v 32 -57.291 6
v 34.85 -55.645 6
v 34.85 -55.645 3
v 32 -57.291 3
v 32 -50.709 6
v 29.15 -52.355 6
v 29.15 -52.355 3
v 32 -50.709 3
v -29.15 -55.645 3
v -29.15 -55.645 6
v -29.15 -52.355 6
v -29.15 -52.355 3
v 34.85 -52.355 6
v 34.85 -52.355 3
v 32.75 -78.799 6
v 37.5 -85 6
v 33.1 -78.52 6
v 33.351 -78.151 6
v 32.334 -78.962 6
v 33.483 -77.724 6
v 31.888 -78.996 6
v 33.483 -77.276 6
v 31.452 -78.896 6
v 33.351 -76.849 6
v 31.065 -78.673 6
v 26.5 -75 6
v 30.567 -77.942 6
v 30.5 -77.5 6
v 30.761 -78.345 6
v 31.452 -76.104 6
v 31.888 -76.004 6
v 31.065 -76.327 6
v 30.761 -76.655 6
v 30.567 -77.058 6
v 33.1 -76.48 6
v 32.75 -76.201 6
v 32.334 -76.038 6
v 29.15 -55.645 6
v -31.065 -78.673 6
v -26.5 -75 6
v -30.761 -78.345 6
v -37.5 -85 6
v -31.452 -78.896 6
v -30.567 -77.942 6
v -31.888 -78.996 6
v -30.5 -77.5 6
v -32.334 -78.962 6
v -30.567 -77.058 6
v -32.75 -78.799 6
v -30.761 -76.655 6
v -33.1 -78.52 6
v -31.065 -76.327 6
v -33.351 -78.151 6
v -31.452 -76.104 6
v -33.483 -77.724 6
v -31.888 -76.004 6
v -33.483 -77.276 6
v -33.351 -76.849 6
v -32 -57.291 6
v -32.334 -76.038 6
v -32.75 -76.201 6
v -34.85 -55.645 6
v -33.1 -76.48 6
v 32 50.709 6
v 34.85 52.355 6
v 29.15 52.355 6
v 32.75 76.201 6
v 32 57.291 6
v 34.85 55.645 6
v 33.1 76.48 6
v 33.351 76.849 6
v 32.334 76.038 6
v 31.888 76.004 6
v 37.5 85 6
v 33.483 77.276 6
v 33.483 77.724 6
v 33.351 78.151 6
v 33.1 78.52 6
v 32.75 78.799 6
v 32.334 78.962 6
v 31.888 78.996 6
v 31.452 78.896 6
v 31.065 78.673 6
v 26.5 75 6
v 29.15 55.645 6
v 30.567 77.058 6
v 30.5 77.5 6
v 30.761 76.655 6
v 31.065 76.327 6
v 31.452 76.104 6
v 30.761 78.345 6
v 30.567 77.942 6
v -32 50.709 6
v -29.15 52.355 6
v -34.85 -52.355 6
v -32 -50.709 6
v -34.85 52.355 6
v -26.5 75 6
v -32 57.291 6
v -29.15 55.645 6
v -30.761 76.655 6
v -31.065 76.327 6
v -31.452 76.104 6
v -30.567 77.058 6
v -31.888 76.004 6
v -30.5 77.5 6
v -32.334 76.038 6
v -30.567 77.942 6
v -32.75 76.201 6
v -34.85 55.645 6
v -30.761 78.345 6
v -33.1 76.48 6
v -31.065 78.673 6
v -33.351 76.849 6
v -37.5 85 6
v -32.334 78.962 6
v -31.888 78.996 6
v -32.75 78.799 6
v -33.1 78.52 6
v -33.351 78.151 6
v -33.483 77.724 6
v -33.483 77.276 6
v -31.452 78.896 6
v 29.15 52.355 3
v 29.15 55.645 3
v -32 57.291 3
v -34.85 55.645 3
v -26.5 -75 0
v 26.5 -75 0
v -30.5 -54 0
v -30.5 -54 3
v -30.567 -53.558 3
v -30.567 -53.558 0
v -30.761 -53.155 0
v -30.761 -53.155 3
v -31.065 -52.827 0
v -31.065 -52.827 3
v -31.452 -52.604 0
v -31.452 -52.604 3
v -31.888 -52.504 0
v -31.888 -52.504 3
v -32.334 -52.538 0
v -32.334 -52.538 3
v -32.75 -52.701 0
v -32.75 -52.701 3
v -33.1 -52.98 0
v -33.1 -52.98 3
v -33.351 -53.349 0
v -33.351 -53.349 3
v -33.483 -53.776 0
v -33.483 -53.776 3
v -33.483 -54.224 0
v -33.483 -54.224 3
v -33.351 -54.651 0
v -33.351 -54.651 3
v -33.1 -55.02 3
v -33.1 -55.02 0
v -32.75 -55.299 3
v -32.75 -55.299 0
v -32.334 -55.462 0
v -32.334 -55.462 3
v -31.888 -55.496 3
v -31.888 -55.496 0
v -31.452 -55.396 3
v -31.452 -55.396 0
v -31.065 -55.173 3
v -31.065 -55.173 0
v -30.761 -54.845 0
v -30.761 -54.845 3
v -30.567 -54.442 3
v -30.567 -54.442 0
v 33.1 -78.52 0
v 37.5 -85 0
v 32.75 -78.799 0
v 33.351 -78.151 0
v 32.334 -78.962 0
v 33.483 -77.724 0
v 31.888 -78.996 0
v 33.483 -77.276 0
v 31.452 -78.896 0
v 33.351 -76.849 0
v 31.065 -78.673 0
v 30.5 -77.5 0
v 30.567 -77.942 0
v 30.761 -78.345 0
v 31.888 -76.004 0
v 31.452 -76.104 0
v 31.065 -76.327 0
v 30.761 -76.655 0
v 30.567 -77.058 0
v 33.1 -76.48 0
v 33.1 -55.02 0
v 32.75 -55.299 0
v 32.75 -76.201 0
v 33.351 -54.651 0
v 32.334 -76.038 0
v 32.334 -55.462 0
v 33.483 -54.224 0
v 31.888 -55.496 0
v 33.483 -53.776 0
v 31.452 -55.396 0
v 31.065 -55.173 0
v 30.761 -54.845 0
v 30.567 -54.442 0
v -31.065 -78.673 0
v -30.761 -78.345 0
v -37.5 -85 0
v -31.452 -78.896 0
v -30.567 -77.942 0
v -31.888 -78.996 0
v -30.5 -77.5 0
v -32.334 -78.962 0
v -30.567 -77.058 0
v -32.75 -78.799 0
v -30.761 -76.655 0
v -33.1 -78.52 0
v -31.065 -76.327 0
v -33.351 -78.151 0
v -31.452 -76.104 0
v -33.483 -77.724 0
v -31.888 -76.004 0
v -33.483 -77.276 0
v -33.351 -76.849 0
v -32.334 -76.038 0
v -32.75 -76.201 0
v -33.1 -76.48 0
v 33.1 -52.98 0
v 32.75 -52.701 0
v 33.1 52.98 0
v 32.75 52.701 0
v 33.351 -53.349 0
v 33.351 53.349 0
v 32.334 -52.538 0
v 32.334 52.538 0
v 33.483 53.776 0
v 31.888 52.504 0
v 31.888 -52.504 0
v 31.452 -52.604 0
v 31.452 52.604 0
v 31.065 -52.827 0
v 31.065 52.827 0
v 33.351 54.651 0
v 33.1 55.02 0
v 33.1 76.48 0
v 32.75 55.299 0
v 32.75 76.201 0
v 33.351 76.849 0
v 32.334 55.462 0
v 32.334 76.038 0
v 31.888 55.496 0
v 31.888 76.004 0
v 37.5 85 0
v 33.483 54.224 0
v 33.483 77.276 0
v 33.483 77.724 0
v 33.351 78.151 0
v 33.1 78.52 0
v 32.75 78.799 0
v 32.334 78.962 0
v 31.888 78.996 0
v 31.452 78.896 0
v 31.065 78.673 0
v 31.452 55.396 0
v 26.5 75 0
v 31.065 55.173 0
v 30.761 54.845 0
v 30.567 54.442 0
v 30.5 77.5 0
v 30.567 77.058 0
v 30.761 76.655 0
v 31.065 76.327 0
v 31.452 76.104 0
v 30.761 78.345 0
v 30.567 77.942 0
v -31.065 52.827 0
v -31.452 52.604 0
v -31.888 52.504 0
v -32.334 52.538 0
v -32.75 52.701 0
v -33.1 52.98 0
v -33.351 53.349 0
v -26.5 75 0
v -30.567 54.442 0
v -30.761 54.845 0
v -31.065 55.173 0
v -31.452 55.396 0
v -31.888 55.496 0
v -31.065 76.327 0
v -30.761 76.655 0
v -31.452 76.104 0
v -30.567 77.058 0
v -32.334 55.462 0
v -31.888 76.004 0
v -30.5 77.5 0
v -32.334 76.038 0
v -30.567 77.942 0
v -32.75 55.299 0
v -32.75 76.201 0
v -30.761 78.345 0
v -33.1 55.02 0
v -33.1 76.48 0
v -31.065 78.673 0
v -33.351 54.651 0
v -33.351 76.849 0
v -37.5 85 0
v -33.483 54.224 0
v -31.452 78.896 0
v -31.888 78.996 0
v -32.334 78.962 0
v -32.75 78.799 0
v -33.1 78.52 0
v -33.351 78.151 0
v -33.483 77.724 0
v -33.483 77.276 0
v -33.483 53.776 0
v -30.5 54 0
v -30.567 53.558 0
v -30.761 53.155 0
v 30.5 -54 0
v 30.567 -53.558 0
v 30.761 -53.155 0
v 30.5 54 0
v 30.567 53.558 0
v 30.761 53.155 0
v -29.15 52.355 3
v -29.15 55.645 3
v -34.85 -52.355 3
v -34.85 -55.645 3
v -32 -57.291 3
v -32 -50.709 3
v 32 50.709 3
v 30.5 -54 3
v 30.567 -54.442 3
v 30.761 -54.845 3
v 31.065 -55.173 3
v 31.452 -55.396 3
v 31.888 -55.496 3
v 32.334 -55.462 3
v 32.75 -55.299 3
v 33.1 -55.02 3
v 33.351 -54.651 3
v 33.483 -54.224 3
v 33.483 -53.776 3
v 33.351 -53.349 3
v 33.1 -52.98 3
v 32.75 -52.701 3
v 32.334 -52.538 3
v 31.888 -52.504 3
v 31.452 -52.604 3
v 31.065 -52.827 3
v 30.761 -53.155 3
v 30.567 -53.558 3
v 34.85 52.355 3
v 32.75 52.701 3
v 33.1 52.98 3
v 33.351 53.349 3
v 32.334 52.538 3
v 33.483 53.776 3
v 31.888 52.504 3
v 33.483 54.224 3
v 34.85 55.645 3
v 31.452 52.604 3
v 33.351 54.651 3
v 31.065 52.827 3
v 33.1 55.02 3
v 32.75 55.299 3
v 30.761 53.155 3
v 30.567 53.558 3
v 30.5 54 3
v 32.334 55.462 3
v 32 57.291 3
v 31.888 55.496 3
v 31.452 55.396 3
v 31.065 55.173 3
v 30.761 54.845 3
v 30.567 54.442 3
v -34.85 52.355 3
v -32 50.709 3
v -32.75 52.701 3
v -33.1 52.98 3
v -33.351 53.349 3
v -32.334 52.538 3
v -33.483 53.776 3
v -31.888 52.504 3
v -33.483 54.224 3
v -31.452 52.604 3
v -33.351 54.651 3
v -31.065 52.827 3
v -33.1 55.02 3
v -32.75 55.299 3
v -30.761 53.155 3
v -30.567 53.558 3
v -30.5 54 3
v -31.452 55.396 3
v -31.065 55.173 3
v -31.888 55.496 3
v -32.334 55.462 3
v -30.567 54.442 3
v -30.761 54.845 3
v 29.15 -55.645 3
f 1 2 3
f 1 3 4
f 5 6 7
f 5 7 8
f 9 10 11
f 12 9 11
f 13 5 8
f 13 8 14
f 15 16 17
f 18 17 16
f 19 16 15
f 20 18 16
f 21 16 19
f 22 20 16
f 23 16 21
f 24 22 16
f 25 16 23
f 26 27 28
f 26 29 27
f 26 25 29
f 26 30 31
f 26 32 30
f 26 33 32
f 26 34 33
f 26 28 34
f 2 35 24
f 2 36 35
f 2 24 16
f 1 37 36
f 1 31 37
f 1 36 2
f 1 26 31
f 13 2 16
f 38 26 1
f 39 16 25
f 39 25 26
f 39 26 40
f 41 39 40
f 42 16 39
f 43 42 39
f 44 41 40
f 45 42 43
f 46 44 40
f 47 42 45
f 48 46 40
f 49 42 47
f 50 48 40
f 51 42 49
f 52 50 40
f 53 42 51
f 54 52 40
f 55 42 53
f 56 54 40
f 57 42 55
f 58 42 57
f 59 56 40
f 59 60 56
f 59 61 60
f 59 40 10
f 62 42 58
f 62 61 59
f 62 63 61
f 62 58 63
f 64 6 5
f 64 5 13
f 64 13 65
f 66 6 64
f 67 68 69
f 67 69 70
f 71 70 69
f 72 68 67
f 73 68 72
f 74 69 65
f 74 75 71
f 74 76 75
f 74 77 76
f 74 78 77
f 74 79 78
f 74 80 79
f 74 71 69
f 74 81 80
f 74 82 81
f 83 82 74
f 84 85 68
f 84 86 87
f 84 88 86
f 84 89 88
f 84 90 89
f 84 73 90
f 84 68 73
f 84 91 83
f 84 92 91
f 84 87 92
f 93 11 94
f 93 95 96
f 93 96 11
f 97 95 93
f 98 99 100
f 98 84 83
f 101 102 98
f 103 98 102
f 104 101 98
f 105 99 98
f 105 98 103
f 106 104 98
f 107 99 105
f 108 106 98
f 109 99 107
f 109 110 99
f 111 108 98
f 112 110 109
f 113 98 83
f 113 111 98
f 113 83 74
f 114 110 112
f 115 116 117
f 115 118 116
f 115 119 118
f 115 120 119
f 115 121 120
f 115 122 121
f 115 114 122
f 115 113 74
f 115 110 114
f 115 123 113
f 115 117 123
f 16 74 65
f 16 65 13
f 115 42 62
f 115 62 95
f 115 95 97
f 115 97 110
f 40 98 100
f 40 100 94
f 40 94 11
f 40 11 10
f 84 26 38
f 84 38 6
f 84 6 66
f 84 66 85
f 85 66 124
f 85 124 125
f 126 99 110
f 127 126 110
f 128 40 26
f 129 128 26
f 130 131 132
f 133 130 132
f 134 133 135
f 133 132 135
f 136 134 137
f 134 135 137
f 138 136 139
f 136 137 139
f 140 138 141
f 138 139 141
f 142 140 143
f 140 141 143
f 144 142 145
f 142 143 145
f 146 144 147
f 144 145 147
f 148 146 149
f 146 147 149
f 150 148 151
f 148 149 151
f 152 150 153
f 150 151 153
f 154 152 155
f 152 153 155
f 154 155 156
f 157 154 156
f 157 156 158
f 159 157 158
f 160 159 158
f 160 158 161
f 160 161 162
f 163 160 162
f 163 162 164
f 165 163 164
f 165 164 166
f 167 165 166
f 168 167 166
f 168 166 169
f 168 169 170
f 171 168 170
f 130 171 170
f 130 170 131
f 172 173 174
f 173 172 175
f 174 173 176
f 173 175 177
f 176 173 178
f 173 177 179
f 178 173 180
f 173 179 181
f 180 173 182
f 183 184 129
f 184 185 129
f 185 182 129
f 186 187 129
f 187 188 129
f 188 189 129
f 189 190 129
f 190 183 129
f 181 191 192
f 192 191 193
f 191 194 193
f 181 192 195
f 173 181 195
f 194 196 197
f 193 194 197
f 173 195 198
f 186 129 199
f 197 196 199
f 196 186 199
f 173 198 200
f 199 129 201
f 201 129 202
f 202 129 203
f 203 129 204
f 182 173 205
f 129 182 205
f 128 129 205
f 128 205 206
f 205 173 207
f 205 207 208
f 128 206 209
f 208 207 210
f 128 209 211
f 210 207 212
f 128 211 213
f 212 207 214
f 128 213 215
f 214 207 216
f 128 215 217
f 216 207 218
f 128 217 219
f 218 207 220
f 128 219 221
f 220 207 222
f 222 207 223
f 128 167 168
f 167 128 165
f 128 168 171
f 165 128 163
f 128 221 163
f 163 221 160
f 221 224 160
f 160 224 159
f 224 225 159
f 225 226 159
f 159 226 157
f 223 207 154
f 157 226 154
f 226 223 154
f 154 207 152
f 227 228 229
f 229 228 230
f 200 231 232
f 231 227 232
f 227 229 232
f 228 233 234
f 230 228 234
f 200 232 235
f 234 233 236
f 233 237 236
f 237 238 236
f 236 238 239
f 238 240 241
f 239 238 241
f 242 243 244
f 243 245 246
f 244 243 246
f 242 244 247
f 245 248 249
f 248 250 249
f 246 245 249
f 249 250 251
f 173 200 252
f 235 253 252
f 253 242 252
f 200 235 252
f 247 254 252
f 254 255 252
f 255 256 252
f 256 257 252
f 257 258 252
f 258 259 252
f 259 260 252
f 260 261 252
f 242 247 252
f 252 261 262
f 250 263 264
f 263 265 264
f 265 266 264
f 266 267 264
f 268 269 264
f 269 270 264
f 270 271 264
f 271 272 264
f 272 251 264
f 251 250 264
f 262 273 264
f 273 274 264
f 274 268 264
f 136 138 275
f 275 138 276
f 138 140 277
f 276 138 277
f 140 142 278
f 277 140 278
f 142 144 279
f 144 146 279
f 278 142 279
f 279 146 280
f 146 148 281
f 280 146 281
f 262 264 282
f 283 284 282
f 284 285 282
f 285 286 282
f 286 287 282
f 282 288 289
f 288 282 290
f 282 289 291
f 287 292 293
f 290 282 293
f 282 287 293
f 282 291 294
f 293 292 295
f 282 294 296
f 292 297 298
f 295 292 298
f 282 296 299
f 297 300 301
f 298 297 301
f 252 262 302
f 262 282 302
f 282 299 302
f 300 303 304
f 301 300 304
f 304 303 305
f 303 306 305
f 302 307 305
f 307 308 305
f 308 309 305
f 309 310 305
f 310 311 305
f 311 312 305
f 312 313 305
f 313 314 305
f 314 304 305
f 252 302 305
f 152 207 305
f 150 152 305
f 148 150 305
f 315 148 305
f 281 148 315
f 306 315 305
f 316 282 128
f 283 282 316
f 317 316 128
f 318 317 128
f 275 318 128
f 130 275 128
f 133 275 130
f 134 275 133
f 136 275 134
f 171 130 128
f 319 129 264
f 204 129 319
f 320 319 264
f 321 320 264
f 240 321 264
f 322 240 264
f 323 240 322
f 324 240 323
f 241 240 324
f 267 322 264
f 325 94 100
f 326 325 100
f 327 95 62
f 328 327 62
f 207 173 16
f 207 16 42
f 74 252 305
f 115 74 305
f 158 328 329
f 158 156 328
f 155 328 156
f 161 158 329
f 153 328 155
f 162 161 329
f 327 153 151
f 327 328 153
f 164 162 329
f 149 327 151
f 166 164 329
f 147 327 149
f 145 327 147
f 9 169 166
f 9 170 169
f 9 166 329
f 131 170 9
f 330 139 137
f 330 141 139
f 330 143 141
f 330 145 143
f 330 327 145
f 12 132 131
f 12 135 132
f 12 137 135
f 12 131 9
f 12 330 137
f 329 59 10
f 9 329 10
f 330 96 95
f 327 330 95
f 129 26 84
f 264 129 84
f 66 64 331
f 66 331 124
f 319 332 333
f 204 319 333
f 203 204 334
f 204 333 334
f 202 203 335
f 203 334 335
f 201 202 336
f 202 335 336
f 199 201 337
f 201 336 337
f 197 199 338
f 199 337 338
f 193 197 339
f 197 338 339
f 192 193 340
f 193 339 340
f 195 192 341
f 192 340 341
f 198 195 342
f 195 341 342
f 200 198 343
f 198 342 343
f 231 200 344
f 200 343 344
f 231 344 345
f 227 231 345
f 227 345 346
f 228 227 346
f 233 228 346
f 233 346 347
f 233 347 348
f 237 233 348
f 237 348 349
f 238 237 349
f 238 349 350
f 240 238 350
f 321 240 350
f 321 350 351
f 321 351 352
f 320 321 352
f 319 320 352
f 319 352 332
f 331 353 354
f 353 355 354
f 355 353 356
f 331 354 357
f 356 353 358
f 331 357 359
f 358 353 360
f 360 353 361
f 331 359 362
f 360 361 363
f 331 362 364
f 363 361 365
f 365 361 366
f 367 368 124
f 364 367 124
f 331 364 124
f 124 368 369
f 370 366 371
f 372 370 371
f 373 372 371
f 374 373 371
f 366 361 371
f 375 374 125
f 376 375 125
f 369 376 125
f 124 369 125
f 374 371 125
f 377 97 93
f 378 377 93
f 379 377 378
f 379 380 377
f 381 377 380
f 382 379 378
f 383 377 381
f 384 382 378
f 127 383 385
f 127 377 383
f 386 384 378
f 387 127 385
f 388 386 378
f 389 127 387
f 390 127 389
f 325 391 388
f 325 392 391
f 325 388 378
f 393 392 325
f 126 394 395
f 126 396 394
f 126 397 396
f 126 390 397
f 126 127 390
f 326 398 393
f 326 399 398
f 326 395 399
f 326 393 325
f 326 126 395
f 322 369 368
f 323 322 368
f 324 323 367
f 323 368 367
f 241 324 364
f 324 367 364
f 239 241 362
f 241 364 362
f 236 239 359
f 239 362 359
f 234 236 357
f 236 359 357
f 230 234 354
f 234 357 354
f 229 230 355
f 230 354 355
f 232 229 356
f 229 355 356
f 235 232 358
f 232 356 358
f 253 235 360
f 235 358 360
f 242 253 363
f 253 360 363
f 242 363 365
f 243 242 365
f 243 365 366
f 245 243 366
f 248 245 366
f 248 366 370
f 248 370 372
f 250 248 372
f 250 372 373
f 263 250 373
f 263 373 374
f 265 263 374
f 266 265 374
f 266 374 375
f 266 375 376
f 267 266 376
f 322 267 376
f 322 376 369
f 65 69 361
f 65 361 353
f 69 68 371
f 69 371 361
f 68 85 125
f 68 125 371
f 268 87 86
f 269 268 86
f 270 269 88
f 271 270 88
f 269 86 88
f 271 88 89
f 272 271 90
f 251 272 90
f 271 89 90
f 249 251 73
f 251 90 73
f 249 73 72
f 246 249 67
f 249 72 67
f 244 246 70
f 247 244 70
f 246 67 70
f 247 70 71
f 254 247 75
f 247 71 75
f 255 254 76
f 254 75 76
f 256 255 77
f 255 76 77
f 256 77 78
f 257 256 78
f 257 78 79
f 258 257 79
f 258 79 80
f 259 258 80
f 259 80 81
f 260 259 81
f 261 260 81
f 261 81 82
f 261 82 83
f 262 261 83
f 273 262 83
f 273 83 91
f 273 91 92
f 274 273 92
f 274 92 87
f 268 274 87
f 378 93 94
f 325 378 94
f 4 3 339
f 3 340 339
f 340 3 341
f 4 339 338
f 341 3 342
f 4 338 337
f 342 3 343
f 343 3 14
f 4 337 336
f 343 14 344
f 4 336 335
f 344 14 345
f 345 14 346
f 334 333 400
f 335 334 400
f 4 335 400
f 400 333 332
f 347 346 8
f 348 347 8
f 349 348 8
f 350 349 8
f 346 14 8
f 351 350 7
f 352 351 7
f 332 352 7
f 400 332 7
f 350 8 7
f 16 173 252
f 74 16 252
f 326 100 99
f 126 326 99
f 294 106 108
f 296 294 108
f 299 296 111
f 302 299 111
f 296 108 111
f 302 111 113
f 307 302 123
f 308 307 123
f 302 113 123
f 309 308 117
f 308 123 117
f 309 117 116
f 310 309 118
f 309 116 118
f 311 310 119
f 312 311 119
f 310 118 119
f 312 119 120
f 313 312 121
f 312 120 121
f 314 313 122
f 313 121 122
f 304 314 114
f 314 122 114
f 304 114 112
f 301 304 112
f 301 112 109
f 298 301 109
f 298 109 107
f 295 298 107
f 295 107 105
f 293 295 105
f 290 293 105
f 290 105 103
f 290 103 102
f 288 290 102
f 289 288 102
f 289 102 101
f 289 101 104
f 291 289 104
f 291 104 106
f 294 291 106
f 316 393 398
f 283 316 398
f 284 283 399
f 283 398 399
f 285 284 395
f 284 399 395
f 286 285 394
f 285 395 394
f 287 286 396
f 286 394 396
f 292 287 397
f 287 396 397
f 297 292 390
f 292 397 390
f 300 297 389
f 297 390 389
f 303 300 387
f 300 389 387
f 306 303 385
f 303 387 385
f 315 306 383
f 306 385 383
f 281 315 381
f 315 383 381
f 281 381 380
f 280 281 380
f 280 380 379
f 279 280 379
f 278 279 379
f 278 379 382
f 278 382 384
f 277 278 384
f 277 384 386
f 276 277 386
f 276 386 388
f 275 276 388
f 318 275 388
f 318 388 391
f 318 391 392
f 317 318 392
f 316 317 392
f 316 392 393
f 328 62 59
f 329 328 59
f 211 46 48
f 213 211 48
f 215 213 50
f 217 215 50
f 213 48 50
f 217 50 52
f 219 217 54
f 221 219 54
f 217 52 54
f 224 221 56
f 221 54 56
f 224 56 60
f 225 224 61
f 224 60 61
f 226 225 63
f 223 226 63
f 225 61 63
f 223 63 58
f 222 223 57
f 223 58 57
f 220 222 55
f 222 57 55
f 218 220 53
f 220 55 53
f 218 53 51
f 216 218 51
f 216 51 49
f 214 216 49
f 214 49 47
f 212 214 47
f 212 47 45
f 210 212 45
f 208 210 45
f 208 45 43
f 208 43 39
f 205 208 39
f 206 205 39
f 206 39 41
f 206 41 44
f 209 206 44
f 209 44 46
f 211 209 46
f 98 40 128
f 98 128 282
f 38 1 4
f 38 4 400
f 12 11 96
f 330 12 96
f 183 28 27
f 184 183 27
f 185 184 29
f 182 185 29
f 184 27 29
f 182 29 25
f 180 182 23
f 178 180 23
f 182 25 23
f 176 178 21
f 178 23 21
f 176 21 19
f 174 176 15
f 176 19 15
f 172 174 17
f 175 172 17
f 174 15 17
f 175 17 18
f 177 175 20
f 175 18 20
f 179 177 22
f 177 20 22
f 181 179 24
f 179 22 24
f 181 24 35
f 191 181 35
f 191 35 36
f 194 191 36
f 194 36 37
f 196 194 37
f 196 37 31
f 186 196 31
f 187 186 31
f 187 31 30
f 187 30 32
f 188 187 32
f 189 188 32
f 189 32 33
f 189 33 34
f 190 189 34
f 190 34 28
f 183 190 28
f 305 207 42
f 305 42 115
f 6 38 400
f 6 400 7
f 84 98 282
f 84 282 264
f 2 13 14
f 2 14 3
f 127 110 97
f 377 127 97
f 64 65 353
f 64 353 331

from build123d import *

# Parameters (mm, degrees)
SKETCH1_W           = 170
SKETCH1_H           = 75
BOSS_EXTRUDE1_DEPTH = 6
SKETCH2_R           = 1.5
CUT_EXTRUDE1_DEPTH  = 94.098066575
CUT_EXTRUDE3_DEPTH  = 3
SKETCH6_W           = 53
SKETCH6_H           = 150
CUT_EXTRUDE4_DEPTH  = 10


with BuildPart() as part:
    # Sketch1 → Boss-Extrude1 (new body)
    with BuildSketch(Plane(origin=(0, 0, 0), x_dir=(0, 1, 0), z_dir=(0, 0, 1))):
        Rectangle(SKETCH1_W, SKETCH1_H)
    extrude(amount=BOSS_EXTRUDE1_DEPTH)

    # Sketch2 → Cut-Extrude1 (cut, through all)
    with BuildSketch(Plane.XY.offset(6)):
        with Locations((-32, 54)):
            Circle(SKETCH2_R)
        with Locations((-32, -54)):
            Circle(SKETCH2_R)
        with Locations((-32, -77.5)):
            Circle(SKETCH2_R)
        with Locations((-32, 77.5)):
            Circle(SKETCH2_R)
        with Locations(Location((32, -77.5, 0), (0, 0, 180))):
            Circle(SKETCH2_R)
        with Locations(Location((32, -54, 0), (0, 0, 180))):
            Circle(SKETCH2_R)
        with Locations(Location((32, 54, 0), (0, 0, 180))):
            Circle(SKETCH2_R)
        with Locations(Location((32, 77.5, 0), (0, 0, 180))):
            Circle(SKETCH2_R)
    extrude(amount=-CUT_EXTRUDE1_DEPTH, mode=Mode.SUBTRACT)

    # Sketch5 → Cut-Extrude3 (cut)
    with BuildSketch(Plane.XY.offset(6)):
        Polygon((-29.15, -55.645448267), (-29.15, -52.354551733), (-32, -50.709103466), (-34.85, -52.354551733), (-34.85, -55.645448267), (-32, -57.290896534), align=None)
        Polygon((32, -57.290896534), (29.15, -55.645448267), (29.15, -52.354551733), (32, -50.709103466), (34.85, -52.354551733), (34.85, -55.645448267), align=None)
        Polygon((-29.15, 55.645448267), (-32, 57.290896534), (-34.85, 55.645448267), (-34.85, 52.354551733), (-32, 50.709103466), (-29.15, 52.354551733), align=None)
        Polygon((29.15, 52.354551733), (29.15, 55.645448267), (32, 57.290896534), (34.85, 55.645448267), (34.85, 52.354551733), (32, 50.709103466), align=None)
    extrude(amount=-CUT_EXTRUDE3_DEPTH, mode=Mode.SUBTRACT)

    # Sketch6 → Cut-Extrude4 (cut)
    with BuildSketch(Plane.XY.offset(6)):
        Rectangle(SKETCH6_W, SKETCH6_H)
    extrude(amount=-CUT_EXTRUDE4_DEPTH, mode=Mode.SUBTRACT)


solid = part.part
